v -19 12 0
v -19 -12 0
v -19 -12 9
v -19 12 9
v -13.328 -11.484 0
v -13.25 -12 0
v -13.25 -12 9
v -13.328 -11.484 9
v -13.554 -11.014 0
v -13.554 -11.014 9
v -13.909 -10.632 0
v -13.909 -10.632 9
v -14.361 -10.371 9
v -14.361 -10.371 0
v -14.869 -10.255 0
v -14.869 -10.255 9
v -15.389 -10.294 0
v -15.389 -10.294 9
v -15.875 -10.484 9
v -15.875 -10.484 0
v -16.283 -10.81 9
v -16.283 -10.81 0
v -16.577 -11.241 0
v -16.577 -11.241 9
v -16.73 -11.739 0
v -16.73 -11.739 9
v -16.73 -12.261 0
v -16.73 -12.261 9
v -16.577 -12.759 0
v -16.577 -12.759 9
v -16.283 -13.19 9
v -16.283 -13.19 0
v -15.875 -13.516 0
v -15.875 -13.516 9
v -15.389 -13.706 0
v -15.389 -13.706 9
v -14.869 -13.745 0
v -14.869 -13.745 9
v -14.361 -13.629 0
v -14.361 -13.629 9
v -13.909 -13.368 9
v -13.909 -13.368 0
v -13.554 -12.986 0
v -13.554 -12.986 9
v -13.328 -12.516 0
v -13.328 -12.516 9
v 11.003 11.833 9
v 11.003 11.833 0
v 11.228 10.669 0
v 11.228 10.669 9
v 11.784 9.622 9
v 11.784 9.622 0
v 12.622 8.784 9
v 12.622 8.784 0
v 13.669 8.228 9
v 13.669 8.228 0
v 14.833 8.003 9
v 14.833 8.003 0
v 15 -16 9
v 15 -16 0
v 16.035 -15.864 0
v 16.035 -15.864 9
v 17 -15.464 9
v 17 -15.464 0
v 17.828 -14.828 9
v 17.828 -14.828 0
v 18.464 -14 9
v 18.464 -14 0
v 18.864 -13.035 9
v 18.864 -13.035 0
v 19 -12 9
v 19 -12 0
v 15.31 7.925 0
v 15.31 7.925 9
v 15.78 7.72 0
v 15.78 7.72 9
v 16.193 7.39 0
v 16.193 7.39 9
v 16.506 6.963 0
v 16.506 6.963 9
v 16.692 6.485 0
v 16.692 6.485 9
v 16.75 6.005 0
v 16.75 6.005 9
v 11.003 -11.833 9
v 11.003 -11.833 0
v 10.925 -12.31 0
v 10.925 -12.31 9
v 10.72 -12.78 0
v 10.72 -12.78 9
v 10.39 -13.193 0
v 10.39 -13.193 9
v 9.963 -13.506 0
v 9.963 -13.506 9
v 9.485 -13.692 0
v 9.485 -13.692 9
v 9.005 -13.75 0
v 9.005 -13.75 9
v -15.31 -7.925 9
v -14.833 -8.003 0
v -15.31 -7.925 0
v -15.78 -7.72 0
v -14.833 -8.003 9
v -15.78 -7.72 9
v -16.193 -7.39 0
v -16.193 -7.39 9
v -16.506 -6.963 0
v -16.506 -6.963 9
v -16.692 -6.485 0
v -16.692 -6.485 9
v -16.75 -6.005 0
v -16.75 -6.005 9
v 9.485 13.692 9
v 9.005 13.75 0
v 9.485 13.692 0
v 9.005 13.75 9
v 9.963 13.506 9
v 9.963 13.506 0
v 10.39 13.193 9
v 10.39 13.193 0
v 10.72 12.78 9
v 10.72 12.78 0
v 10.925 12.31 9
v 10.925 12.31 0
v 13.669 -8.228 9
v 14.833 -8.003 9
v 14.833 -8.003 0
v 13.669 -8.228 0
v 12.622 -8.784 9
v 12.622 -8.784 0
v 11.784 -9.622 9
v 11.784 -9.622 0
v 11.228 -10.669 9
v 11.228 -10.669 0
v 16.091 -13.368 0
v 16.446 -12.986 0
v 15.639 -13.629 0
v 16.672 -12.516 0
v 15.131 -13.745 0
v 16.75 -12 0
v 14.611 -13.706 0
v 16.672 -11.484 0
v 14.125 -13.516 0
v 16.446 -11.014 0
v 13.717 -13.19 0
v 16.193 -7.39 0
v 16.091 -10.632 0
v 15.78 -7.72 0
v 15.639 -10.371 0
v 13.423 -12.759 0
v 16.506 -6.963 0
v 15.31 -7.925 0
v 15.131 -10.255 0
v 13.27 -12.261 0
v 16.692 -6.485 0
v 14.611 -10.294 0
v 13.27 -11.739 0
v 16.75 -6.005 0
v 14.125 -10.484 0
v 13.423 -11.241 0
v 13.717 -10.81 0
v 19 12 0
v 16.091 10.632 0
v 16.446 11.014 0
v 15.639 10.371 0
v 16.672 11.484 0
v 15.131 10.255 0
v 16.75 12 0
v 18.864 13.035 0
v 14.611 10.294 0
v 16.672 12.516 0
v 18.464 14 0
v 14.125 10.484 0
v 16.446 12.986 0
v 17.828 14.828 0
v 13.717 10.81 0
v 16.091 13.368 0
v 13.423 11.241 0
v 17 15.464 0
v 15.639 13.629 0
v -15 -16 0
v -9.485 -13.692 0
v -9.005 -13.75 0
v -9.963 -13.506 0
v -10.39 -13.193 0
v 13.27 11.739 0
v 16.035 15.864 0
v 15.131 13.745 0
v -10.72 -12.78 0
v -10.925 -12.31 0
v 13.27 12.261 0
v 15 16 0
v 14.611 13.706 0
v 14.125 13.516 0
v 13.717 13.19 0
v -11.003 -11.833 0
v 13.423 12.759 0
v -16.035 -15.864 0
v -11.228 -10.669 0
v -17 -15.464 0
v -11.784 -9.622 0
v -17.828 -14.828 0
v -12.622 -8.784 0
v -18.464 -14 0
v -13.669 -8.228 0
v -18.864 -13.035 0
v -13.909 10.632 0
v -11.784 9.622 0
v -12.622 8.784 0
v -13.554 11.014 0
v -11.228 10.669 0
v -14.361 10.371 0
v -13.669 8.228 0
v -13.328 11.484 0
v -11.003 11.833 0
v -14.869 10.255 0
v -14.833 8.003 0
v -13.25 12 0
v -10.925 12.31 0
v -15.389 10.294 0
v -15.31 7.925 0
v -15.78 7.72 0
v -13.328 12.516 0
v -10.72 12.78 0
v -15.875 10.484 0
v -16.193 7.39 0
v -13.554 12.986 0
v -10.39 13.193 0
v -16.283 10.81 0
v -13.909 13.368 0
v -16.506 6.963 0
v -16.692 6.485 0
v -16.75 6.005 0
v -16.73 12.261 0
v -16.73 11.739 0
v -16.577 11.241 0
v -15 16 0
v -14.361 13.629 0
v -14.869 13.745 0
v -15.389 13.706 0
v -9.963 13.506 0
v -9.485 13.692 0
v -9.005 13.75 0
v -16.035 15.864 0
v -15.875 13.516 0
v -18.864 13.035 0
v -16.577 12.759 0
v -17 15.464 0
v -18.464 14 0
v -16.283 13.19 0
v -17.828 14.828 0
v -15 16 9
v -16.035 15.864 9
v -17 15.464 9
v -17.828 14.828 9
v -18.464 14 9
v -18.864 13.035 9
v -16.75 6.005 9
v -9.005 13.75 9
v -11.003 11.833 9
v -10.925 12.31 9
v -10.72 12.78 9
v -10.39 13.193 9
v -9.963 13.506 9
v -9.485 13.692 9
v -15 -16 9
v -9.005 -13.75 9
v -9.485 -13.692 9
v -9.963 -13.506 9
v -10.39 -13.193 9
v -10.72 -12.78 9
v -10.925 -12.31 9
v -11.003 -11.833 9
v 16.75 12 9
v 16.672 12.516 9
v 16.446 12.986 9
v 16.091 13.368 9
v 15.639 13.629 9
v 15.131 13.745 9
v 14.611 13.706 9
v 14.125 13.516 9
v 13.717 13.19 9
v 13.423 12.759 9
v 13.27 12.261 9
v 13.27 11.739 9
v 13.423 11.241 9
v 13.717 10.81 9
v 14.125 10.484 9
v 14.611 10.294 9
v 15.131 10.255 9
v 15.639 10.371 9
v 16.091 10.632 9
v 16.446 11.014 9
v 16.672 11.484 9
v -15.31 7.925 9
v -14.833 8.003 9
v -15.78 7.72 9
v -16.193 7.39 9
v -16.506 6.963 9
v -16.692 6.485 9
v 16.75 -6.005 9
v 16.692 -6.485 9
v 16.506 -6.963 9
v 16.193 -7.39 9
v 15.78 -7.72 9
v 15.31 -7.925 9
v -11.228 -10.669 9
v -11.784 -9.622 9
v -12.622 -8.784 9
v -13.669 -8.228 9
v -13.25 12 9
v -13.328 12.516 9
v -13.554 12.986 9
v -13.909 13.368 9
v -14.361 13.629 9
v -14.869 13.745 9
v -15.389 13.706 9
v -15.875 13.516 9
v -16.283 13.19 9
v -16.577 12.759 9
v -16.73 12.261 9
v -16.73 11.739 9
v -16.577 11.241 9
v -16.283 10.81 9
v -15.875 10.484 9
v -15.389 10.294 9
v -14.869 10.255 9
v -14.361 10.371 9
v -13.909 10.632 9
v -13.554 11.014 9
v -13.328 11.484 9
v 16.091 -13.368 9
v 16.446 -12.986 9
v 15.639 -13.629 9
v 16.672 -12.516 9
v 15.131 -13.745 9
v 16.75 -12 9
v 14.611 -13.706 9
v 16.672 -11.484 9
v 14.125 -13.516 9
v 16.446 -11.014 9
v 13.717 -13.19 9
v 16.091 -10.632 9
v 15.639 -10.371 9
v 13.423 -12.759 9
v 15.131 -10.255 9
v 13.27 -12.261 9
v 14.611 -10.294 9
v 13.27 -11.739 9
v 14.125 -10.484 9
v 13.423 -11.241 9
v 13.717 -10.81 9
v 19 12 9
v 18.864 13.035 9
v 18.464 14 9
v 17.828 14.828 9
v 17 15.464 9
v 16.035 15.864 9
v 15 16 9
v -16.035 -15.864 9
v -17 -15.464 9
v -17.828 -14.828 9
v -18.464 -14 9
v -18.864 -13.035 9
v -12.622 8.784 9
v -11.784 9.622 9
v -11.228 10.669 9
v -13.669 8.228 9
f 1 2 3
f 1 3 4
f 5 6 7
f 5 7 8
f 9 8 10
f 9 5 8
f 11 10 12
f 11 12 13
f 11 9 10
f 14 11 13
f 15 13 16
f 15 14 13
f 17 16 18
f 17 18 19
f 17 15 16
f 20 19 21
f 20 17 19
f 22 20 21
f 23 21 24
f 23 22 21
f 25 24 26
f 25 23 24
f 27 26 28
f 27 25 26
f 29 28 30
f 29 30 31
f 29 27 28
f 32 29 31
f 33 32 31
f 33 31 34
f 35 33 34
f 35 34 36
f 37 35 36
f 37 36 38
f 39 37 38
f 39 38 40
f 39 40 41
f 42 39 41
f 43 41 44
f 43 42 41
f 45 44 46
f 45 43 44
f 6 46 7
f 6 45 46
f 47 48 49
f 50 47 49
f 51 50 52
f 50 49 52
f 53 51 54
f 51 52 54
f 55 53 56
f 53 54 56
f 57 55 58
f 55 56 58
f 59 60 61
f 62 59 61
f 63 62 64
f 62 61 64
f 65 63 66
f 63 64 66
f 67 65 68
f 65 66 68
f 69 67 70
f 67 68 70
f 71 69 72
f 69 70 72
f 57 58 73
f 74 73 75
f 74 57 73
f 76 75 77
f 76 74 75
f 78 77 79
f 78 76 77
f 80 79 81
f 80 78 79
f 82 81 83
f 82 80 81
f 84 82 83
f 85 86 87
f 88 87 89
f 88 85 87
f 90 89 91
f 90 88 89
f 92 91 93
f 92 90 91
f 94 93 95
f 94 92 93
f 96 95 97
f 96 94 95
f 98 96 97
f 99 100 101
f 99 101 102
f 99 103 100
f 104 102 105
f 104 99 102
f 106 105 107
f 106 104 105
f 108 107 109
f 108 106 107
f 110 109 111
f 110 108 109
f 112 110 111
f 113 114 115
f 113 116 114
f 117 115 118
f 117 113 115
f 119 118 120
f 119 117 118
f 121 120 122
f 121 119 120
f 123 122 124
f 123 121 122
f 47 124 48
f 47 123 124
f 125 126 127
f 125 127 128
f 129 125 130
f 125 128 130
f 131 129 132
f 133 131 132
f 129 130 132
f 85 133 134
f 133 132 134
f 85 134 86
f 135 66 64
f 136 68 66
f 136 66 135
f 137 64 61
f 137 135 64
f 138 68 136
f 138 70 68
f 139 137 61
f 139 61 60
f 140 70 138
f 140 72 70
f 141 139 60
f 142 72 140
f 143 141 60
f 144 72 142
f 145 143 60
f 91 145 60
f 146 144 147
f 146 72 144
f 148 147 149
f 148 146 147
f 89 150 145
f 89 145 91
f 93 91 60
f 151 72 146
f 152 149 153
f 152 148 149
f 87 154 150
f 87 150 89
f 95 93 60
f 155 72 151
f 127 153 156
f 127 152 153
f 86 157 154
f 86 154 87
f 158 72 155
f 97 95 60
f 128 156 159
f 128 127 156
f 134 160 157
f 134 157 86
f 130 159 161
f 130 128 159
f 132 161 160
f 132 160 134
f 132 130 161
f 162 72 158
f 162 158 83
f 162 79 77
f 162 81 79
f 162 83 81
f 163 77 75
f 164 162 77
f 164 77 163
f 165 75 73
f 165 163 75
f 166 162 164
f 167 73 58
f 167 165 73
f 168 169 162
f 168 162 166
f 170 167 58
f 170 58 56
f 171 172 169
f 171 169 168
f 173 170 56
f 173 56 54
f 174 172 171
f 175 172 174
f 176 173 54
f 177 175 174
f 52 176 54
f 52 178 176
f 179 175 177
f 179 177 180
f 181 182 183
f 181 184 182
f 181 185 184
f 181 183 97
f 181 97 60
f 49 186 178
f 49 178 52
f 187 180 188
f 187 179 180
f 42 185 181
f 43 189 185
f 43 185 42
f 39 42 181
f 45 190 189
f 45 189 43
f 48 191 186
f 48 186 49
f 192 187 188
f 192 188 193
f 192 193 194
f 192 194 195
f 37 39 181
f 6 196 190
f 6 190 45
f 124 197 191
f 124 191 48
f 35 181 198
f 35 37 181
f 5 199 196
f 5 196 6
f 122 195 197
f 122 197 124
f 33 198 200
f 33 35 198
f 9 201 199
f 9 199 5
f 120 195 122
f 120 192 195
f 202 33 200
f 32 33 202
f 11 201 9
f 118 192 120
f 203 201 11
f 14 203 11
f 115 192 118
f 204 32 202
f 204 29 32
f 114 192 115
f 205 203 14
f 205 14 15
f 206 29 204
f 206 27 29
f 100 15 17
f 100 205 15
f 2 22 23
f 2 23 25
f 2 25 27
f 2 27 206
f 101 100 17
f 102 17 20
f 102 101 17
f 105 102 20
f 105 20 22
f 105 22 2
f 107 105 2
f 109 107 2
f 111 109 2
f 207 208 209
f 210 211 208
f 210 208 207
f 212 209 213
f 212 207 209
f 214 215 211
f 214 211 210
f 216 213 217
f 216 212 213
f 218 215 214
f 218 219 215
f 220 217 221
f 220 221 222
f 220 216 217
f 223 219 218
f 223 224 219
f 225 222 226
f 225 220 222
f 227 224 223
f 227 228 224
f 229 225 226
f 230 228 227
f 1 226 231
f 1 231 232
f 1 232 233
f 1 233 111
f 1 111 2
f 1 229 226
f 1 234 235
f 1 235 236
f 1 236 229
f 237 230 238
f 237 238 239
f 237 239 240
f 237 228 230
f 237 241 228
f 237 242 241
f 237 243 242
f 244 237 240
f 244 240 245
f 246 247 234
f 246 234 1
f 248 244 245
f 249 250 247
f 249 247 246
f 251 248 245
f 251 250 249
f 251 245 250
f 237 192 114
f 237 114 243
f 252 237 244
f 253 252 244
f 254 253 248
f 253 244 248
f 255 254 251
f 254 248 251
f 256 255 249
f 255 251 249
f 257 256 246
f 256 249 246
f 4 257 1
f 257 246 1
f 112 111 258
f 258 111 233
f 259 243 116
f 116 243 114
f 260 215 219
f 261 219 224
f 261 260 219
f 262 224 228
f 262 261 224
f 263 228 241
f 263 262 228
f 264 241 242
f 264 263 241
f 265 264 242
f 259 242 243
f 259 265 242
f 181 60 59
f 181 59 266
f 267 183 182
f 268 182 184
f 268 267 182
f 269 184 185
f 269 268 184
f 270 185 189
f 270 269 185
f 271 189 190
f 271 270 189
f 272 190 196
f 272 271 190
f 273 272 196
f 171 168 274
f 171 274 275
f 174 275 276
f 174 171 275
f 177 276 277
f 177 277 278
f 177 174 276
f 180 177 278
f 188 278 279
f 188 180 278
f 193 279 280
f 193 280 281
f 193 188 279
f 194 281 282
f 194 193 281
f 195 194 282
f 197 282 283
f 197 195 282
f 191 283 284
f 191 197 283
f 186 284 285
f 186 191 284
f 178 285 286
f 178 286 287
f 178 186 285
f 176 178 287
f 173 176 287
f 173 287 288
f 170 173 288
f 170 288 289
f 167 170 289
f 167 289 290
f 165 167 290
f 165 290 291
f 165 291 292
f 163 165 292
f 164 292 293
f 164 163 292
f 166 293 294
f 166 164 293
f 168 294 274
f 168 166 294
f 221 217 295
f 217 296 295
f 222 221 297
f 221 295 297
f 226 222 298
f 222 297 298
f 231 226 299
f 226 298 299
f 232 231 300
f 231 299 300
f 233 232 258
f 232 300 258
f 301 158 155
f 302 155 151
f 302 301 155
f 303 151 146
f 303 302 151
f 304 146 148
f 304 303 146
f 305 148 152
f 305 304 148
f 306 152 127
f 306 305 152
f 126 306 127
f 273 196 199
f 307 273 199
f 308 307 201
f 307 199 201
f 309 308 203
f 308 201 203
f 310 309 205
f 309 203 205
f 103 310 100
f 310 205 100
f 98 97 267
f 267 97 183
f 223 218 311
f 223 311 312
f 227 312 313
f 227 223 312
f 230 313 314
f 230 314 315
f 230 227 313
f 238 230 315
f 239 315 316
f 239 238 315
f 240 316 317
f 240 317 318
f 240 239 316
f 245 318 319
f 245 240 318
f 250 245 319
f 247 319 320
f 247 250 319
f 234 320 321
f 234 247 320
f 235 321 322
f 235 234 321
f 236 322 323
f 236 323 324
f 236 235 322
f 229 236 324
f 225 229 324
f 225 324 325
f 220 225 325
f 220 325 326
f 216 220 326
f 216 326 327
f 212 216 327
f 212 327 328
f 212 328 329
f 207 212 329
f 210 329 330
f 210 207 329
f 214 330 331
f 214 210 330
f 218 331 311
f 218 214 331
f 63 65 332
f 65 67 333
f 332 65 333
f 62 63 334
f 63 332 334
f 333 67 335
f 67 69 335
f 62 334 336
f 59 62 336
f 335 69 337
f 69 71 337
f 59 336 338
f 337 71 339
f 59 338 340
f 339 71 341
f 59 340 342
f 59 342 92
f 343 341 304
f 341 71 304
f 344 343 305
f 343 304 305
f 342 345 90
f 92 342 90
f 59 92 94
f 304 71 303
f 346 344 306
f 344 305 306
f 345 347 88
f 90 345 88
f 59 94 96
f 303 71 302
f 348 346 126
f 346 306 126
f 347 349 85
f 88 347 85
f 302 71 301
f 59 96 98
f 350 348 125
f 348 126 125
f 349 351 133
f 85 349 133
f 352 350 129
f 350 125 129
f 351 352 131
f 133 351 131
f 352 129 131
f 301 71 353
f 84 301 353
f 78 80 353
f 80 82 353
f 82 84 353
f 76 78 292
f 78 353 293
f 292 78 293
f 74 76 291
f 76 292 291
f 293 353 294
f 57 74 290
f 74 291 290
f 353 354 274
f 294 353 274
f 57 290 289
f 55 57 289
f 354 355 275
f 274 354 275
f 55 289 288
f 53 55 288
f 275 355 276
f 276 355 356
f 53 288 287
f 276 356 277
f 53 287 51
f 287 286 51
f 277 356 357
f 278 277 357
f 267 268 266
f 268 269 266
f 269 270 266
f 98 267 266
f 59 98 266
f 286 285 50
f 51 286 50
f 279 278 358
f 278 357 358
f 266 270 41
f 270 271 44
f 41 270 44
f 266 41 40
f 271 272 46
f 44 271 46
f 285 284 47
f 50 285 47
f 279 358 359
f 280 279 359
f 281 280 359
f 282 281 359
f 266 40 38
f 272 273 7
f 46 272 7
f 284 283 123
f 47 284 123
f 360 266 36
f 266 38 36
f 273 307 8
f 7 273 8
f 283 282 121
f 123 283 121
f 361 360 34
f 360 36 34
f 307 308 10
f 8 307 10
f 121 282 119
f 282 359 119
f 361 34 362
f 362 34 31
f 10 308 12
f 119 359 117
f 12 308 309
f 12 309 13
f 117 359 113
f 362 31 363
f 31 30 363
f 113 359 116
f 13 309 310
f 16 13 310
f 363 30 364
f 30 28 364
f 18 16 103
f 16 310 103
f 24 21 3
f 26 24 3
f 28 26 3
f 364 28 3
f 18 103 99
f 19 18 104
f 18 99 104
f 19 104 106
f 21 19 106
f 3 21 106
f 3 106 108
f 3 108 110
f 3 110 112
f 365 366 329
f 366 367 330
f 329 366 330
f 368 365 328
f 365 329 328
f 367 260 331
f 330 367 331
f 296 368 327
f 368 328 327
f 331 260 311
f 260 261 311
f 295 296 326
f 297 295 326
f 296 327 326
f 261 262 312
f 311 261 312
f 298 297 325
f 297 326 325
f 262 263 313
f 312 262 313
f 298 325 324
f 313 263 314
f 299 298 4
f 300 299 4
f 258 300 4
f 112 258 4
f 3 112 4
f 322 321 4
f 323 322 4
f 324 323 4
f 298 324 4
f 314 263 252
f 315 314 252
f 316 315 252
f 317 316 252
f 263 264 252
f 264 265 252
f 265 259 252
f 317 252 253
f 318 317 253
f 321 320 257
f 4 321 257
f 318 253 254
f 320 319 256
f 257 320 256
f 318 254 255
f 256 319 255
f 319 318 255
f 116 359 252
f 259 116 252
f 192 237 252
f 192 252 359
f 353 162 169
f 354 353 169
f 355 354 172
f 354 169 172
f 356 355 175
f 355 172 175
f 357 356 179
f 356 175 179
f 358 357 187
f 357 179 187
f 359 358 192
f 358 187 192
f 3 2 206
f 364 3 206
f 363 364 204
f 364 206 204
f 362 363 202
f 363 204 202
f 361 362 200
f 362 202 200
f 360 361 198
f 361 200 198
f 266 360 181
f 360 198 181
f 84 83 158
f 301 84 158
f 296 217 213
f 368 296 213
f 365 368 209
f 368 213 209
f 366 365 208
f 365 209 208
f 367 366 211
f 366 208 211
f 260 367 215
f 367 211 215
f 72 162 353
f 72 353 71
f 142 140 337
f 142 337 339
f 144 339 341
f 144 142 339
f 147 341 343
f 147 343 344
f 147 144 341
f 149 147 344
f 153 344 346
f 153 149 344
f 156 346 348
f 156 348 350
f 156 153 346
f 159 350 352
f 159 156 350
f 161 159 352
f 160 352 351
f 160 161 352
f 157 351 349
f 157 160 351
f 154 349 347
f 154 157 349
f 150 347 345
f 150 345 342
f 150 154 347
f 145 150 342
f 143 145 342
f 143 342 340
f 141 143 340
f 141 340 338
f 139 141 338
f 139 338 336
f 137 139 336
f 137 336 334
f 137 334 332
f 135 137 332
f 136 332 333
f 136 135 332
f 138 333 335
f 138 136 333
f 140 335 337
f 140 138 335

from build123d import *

# Parameters (mm, degrees)
SKETCH_R  = 1.75
PAD_DEPTH = 9
FILLET_R  = 2


with BuildPart() as part:
    # Sketch → Pad (new body)
    with BuildSketch(Plane.XY):
        with BuildLine():
            Line((-15, 16), (15, 16))
            ThreePointArc((19, 12), (17.828427, 14.828427), (15, 16))
            Line((19, 12), (19, -12))
            ThreePointArc((15, -16), (17.828427, -14.828427), (19, -12))
            Line((15, -16), (-15, -16))
            ThreePointArc((-19, -12), (-17.828427, -14.828427), (-15, -16))
            Line((-19, -12), (-19, 12))
            ThreePointArc((-15, 16), (-17.828427, 14.828427), (-19, 12))
        make_face()
        with Locations((-15, 12)):
            Circle(SKETCH_R, mode=Mode.SUBTRACT)
        with Locations((15, 12)):
            Circle(SKETCH_R, mode=Mode.SUBTRACT)
        with Locations((15, -12)):
            Circle(SKETCH_R, mode=Mode.SUBTRACT)
        with Locations((-15, -12)):
            Circle(SKETCH_R, mode=Mode.SUBTRACT)
        with BuildLine():
            Line((-16.75, 8), (-15, 8))
            ThreePointArc((-15, 8), (-12.171573, 9.171573), (-11, 12))
            Line((-11, 12), (-11, 13.75))
            Line((-11, 13.75), (11, 13.75))
            Line((11, 13.75), (11, 12))
            ThreePointArc((11, 12), (12.171573, 9.171573), (15, 8))
            Line((15, 8), (16.75, 8))
            Line((16.75, 8), (16.75, -8))
            Line((15, -8), (16.75, -8))
            ThreePointArc((15, -8), (12.171573, -9.171573), (11, -12))
            Line((11, -13.75), (11, -12))
            Line((11, -13.75), (-11, -13.75))
            Line((-11, -12), (-11, -13.75))
            ThreePointArc((-11, -12), (-12.171573, -9.171573), (-15, -8))
            Line((-16.75, -8), (-15, -8))
            Line((-16.75, -8), (-16.75, 8))
        make_face(mode=Mode.SUBTRACT)
    extrude(amount=PAD_DEPTH)

    # Fillet
    fillet_edges = [part.edges().sort_by_distance(p)[0] for p in [
        (-11, 13.75, 4.5),
        (-16.75, 8, 4.5),
        (11, 13.75, 4.5),
        (16.75, 8, 4.5),
        (16.75, -8, 4.5),
        (11, -13.75, 4.5),
        (-11, -13.75, 4.5),
        (-16.75, -8, 4.5),
    ]]
    fillet(fillet_edges, radius=FILLET_R)


solid = part.part
